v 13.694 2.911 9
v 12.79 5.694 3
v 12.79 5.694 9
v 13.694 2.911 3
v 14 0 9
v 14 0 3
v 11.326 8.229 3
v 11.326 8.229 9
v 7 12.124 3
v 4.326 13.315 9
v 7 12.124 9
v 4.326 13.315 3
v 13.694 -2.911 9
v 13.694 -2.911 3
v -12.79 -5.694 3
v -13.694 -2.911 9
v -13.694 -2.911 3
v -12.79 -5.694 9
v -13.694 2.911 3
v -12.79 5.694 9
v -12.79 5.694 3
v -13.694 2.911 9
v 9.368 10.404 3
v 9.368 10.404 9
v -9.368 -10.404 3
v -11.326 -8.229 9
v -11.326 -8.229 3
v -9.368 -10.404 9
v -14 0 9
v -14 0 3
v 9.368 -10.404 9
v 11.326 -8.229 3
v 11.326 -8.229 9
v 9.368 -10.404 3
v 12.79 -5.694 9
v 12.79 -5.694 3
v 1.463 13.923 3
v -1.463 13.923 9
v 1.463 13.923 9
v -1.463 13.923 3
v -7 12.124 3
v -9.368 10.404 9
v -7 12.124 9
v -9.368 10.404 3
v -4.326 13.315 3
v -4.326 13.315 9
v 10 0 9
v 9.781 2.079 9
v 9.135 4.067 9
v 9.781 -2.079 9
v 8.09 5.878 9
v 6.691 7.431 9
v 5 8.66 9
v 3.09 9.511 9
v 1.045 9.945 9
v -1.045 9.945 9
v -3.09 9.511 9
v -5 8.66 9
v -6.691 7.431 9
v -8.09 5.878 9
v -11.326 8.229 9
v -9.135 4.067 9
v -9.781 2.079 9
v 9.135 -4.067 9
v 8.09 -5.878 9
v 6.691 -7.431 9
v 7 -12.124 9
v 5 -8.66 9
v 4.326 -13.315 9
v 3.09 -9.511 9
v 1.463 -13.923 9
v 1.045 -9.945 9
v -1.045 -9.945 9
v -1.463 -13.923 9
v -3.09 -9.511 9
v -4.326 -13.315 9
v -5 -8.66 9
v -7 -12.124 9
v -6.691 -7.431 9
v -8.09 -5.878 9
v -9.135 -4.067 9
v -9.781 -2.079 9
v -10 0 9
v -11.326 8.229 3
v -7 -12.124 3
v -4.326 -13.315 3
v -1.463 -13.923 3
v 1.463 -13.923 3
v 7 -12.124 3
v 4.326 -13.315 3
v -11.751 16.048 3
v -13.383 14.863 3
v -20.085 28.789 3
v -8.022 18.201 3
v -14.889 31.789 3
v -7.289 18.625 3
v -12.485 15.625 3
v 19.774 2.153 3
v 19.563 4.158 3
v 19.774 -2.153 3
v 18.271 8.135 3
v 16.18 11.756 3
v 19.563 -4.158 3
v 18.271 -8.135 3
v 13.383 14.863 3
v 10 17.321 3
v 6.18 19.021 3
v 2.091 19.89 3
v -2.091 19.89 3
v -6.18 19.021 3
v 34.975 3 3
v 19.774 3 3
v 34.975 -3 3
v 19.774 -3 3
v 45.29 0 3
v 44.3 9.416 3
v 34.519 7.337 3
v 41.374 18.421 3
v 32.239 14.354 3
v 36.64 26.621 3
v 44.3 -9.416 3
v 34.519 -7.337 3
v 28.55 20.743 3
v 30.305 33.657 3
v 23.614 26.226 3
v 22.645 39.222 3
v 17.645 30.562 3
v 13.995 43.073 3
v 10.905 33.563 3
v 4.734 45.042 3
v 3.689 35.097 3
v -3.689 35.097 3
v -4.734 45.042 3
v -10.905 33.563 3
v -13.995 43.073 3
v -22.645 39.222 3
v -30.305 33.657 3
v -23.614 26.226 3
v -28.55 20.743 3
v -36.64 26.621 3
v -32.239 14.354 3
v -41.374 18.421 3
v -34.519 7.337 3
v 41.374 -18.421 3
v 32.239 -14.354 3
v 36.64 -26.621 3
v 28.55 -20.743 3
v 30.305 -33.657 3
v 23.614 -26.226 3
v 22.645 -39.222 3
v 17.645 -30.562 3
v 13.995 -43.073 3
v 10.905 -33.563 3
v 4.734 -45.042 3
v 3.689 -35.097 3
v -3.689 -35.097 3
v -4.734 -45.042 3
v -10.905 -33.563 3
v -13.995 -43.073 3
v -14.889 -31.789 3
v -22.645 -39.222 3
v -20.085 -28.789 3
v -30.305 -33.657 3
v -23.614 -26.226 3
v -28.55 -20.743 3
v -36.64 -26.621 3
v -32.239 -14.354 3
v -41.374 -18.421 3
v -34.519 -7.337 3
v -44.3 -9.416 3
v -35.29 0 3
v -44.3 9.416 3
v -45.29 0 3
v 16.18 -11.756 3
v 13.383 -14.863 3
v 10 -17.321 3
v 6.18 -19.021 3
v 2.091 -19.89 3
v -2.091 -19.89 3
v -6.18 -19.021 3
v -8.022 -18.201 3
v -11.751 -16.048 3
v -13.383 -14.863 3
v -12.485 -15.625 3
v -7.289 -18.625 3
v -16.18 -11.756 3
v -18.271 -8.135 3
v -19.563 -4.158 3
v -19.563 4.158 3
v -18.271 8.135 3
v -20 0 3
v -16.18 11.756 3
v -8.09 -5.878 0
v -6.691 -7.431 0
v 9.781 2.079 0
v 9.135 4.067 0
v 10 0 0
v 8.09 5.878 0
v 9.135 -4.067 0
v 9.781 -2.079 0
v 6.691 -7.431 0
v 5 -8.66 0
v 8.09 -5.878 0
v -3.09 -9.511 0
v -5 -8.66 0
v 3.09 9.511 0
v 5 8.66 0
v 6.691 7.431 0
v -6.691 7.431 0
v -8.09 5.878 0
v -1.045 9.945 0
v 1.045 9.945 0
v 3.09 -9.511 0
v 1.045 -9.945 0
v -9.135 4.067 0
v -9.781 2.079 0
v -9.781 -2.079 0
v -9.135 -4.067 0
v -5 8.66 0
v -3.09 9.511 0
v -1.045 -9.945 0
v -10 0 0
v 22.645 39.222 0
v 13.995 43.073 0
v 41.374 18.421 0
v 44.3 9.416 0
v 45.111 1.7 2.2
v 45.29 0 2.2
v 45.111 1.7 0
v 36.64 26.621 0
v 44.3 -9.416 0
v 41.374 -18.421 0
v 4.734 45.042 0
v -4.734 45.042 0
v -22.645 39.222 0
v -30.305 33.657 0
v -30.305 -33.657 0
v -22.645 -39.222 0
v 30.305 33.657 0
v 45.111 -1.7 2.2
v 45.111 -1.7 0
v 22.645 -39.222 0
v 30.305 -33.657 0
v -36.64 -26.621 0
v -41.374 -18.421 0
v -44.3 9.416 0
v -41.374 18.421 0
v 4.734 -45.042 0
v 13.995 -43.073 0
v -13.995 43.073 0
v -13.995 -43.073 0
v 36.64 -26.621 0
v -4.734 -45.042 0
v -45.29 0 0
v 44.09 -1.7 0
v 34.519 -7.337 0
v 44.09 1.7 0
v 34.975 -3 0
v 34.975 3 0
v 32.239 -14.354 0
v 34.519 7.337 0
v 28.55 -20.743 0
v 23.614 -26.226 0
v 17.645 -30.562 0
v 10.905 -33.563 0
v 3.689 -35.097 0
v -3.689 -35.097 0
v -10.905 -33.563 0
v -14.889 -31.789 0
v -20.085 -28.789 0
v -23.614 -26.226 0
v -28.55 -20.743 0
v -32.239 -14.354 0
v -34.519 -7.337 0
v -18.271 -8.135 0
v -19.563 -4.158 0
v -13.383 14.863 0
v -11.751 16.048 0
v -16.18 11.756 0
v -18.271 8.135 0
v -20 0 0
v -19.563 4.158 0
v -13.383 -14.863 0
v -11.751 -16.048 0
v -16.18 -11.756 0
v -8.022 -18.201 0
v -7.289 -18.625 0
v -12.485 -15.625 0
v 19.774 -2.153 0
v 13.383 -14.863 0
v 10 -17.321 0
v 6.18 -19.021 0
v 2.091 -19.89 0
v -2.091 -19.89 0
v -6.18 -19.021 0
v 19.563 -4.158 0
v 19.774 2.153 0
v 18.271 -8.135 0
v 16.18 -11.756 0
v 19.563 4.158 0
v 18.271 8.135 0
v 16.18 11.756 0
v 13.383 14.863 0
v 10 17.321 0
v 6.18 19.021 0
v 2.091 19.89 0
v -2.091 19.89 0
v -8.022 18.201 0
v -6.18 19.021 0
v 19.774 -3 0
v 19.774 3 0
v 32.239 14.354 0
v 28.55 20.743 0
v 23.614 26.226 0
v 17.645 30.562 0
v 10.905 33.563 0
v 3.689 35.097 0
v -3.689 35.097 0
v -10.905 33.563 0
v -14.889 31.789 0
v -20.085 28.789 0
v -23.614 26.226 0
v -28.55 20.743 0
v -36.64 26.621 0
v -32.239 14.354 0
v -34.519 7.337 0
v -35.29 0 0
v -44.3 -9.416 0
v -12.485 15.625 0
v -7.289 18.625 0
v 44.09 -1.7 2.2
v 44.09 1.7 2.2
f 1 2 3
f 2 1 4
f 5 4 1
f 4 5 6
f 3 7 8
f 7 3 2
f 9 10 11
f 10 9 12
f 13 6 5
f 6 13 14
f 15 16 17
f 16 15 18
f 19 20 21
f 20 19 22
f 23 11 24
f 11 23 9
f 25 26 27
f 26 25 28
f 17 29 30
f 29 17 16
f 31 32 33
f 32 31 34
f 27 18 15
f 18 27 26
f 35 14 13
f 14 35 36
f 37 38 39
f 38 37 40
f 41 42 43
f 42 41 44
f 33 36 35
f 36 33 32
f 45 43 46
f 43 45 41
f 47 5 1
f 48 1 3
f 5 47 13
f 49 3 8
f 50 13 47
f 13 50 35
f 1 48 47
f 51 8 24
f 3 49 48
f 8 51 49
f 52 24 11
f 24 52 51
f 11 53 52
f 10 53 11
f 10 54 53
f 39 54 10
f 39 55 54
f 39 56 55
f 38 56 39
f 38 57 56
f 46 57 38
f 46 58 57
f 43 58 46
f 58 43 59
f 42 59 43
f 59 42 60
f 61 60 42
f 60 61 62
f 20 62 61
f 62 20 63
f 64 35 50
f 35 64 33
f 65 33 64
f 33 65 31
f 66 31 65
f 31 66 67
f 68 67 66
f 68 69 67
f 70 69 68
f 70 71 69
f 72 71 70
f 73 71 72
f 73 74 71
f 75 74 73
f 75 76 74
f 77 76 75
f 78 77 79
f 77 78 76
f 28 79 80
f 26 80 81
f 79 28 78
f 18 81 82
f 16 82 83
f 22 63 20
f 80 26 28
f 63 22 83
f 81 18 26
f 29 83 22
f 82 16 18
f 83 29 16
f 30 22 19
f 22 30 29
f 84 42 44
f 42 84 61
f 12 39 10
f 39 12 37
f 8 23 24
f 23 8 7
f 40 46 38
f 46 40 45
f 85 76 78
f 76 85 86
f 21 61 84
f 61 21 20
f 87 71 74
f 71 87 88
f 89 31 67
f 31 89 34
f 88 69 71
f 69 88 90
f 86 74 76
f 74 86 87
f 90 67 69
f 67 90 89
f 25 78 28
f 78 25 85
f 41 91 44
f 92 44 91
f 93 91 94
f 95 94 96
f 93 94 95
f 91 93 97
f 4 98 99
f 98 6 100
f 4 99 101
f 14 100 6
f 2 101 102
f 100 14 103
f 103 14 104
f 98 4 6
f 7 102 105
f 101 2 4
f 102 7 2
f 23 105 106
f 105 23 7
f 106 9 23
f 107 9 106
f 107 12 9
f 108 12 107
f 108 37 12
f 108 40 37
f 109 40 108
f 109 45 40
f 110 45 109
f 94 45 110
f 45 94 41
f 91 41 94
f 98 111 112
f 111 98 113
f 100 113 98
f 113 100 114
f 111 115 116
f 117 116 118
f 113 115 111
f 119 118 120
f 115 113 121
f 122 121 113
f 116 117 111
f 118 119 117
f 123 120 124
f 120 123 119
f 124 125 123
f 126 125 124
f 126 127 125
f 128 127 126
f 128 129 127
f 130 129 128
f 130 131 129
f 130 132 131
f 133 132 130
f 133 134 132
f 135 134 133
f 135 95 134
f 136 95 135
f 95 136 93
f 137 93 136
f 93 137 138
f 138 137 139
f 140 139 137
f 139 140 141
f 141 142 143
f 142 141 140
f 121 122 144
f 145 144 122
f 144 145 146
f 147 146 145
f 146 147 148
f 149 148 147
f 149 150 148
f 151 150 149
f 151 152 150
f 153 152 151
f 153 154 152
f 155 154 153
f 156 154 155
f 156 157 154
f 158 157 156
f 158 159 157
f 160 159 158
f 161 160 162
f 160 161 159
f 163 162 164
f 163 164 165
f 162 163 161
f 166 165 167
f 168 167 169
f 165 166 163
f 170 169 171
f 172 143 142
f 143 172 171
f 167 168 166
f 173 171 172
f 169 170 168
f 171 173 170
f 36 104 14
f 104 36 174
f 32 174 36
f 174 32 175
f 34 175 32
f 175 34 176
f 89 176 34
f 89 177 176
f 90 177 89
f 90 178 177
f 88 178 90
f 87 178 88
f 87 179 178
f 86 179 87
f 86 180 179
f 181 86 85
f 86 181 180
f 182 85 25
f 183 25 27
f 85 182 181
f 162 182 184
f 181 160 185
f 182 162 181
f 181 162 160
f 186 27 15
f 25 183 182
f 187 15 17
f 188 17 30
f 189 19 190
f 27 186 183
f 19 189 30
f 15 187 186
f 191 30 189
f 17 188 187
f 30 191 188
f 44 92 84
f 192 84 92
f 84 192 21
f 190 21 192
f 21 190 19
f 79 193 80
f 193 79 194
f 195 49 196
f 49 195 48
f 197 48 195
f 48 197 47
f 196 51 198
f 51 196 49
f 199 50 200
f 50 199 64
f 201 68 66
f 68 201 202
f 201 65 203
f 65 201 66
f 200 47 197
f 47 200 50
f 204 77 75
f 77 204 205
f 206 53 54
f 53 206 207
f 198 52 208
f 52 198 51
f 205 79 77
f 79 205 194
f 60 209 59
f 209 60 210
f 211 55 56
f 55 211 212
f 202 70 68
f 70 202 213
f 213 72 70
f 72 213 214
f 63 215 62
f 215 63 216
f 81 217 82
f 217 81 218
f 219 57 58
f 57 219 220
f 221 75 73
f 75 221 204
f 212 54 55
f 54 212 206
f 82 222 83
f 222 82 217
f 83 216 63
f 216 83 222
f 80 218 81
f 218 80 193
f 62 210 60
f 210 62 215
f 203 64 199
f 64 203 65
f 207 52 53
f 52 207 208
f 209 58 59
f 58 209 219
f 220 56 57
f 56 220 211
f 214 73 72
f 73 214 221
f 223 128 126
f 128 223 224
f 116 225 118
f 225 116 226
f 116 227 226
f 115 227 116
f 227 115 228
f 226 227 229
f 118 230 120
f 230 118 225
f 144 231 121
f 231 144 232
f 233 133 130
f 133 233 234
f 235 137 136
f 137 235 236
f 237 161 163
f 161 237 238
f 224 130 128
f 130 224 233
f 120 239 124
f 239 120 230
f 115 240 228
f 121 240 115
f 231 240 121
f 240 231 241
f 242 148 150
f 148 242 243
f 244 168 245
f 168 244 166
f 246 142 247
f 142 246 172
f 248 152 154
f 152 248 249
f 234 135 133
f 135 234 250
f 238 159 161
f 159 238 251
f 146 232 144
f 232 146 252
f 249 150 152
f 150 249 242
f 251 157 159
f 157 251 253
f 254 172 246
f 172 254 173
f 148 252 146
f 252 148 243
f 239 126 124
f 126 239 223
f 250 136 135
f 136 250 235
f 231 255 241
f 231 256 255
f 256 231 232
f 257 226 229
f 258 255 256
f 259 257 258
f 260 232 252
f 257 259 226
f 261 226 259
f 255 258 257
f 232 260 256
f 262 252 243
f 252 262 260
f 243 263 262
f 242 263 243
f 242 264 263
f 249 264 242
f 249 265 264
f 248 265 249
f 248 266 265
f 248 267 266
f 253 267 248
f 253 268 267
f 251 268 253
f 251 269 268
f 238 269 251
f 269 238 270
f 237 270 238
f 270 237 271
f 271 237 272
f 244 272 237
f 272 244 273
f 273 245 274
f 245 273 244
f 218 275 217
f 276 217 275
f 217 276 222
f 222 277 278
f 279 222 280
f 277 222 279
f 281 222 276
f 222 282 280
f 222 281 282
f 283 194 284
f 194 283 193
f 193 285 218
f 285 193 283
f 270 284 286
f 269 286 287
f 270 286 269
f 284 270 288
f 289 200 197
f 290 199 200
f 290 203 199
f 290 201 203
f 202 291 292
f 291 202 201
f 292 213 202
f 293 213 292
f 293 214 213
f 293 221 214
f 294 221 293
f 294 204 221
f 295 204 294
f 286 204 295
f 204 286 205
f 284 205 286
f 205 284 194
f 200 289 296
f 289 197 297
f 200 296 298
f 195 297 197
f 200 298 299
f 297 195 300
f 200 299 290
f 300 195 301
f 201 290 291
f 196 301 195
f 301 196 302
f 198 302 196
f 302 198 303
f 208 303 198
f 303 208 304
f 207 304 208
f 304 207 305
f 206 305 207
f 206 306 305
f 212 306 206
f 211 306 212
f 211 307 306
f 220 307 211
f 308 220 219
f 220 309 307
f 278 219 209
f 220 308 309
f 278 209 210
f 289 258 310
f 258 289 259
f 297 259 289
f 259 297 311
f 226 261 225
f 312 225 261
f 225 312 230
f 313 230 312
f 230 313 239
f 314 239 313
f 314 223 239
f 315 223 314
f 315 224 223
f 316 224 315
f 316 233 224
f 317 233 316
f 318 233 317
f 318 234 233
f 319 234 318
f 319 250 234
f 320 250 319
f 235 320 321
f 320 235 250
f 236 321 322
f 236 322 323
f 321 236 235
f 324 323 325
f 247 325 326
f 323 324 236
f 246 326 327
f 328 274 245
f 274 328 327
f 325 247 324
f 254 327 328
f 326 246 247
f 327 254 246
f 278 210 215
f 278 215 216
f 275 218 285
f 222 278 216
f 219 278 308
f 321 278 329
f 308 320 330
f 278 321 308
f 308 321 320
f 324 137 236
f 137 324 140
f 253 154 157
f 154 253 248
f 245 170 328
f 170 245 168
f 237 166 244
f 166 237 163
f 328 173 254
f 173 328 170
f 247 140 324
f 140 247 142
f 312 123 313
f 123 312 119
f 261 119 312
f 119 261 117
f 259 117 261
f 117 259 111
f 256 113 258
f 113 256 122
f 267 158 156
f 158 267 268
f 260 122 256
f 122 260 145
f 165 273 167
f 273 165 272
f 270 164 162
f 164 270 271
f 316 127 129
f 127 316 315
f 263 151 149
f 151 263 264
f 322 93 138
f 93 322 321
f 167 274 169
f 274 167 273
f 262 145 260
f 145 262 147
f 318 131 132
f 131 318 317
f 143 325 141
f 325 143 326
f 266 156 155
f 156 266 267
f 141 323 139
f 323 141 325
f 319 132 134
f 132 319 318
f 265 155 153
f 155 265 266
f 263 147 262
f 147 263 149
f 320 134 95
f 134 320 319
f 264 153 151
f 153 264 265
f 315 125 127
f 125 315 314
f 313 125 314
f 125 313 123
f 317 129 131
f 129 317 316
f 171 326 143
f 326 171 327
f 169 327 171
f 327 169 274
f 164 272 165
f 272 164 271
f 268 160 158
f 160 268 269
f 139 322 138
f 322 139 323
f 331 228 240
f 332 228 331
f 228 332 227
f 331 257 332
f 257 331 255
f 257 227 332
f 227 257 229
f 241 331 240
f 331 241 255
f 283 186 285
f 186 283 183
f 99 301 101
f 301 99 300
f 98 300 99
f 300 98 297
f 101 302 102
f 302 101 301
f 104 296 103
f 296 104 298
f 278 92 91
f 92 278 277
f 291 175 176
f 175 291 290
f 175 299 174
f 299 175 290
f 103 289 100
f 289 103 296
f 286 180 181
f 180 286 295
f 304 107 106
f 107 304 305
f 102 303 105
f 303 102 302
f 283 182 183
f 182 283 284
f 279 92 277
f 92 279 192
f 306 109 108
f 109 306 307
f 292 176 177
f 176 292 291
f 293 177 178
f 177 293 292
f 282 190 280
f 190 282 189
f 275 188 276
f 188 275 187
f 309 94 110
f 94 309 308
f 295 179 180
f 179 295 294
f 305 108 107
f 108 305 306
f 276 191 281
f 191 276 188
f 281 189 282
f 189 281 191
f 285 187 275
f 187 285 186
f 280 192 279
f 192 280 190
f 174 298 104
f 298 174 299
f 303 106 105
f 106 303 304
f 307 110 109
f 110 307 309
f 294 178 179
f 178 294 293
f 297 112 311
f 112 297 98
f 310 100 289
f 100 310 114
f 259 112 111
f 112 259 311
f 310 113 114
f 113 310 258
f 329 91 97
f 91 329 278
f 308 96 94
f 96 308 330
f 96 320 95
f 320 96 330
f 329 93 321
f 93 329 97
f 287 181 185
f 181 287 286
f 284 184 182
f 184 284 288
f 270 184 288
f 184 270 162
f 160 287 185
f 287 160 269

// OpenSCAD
// ===================== PARAMETERS =====================
od        = 3.7 * 25.4;  // outer diameter of mating shell (must match middle connector)
wall      = 1.5;          // shell wall thickness (must match middle connector)
fit_clr   = 0.4;          // diametral clearance for disc inside top ring
disc_d    = od - 2*wall - fit_clr;  // disc OD ~90.58 mm (fits inside top ring)
disc_h    = 3;            // matches top_h of middle connector for flush fit
center_d  = 20;            // center bore diameter
post_d    = 28;            // upper post outer diameter
post_h    = 6;
ring_w    = 10;            // outer ring width
n_spokes  = 3;             // number of spokes
spoke_w   = 6;             // spoke width (tangential)
// alignment key notch (matches middle connector key)
key_w       = 3;     // tangential width
key_h       = 2;     // height (Z)
key_depth   = 1;     // radial depth
key_clr     = 0.2;   // clearance around key
// ======================================================

// upper post
translate([0,0,disc_h]) {
    difference() {
        cylinder(h=post_h, d=post_d);
        cylinder(h=post_h, d=center_d);
    }
}

// lower platform: outer ring + inner hub + spokes
translate([0,0,0]) {
    // outer ring with key notch
    difference() {
        cylinder(h=disc_h, d=disc_d);
        cylinder(h=disc_h, d=disc_d - 2*ring_w);
        // key notch (cut from bottom so mount rests on key)
        translate([disc_d/2 - key_depth - key_clr,
                   -(key_w + 2*key_clr)/2,
                   -1])
            cube([key_depth + key_clr + 1,
                  key_w + 2*key_clr,
                  key_h + key_clr + 1]);
    }

    // inner hub (solid to 20mm radius)
    difference() {
        cylinder(h=disc_h, d=40);
        cylinder(h=disc_h, d=center_d);
    }

    // spokes (start inward to fully connect to curved hub)
    spoke_r_start = sqrt(20*20 - (spoke_w/2)*(spoke_w/2));
    for(i = [0 : n_spokes-1]) {
        rotate([0, 0, i * 360/n_spokes])
            translate([spoke_r_start, -spoke_w/2, 0])
                cube([disc_d/2 - ring_w - spoke_r_start, spoke_w, disc_h]);
    }
}
